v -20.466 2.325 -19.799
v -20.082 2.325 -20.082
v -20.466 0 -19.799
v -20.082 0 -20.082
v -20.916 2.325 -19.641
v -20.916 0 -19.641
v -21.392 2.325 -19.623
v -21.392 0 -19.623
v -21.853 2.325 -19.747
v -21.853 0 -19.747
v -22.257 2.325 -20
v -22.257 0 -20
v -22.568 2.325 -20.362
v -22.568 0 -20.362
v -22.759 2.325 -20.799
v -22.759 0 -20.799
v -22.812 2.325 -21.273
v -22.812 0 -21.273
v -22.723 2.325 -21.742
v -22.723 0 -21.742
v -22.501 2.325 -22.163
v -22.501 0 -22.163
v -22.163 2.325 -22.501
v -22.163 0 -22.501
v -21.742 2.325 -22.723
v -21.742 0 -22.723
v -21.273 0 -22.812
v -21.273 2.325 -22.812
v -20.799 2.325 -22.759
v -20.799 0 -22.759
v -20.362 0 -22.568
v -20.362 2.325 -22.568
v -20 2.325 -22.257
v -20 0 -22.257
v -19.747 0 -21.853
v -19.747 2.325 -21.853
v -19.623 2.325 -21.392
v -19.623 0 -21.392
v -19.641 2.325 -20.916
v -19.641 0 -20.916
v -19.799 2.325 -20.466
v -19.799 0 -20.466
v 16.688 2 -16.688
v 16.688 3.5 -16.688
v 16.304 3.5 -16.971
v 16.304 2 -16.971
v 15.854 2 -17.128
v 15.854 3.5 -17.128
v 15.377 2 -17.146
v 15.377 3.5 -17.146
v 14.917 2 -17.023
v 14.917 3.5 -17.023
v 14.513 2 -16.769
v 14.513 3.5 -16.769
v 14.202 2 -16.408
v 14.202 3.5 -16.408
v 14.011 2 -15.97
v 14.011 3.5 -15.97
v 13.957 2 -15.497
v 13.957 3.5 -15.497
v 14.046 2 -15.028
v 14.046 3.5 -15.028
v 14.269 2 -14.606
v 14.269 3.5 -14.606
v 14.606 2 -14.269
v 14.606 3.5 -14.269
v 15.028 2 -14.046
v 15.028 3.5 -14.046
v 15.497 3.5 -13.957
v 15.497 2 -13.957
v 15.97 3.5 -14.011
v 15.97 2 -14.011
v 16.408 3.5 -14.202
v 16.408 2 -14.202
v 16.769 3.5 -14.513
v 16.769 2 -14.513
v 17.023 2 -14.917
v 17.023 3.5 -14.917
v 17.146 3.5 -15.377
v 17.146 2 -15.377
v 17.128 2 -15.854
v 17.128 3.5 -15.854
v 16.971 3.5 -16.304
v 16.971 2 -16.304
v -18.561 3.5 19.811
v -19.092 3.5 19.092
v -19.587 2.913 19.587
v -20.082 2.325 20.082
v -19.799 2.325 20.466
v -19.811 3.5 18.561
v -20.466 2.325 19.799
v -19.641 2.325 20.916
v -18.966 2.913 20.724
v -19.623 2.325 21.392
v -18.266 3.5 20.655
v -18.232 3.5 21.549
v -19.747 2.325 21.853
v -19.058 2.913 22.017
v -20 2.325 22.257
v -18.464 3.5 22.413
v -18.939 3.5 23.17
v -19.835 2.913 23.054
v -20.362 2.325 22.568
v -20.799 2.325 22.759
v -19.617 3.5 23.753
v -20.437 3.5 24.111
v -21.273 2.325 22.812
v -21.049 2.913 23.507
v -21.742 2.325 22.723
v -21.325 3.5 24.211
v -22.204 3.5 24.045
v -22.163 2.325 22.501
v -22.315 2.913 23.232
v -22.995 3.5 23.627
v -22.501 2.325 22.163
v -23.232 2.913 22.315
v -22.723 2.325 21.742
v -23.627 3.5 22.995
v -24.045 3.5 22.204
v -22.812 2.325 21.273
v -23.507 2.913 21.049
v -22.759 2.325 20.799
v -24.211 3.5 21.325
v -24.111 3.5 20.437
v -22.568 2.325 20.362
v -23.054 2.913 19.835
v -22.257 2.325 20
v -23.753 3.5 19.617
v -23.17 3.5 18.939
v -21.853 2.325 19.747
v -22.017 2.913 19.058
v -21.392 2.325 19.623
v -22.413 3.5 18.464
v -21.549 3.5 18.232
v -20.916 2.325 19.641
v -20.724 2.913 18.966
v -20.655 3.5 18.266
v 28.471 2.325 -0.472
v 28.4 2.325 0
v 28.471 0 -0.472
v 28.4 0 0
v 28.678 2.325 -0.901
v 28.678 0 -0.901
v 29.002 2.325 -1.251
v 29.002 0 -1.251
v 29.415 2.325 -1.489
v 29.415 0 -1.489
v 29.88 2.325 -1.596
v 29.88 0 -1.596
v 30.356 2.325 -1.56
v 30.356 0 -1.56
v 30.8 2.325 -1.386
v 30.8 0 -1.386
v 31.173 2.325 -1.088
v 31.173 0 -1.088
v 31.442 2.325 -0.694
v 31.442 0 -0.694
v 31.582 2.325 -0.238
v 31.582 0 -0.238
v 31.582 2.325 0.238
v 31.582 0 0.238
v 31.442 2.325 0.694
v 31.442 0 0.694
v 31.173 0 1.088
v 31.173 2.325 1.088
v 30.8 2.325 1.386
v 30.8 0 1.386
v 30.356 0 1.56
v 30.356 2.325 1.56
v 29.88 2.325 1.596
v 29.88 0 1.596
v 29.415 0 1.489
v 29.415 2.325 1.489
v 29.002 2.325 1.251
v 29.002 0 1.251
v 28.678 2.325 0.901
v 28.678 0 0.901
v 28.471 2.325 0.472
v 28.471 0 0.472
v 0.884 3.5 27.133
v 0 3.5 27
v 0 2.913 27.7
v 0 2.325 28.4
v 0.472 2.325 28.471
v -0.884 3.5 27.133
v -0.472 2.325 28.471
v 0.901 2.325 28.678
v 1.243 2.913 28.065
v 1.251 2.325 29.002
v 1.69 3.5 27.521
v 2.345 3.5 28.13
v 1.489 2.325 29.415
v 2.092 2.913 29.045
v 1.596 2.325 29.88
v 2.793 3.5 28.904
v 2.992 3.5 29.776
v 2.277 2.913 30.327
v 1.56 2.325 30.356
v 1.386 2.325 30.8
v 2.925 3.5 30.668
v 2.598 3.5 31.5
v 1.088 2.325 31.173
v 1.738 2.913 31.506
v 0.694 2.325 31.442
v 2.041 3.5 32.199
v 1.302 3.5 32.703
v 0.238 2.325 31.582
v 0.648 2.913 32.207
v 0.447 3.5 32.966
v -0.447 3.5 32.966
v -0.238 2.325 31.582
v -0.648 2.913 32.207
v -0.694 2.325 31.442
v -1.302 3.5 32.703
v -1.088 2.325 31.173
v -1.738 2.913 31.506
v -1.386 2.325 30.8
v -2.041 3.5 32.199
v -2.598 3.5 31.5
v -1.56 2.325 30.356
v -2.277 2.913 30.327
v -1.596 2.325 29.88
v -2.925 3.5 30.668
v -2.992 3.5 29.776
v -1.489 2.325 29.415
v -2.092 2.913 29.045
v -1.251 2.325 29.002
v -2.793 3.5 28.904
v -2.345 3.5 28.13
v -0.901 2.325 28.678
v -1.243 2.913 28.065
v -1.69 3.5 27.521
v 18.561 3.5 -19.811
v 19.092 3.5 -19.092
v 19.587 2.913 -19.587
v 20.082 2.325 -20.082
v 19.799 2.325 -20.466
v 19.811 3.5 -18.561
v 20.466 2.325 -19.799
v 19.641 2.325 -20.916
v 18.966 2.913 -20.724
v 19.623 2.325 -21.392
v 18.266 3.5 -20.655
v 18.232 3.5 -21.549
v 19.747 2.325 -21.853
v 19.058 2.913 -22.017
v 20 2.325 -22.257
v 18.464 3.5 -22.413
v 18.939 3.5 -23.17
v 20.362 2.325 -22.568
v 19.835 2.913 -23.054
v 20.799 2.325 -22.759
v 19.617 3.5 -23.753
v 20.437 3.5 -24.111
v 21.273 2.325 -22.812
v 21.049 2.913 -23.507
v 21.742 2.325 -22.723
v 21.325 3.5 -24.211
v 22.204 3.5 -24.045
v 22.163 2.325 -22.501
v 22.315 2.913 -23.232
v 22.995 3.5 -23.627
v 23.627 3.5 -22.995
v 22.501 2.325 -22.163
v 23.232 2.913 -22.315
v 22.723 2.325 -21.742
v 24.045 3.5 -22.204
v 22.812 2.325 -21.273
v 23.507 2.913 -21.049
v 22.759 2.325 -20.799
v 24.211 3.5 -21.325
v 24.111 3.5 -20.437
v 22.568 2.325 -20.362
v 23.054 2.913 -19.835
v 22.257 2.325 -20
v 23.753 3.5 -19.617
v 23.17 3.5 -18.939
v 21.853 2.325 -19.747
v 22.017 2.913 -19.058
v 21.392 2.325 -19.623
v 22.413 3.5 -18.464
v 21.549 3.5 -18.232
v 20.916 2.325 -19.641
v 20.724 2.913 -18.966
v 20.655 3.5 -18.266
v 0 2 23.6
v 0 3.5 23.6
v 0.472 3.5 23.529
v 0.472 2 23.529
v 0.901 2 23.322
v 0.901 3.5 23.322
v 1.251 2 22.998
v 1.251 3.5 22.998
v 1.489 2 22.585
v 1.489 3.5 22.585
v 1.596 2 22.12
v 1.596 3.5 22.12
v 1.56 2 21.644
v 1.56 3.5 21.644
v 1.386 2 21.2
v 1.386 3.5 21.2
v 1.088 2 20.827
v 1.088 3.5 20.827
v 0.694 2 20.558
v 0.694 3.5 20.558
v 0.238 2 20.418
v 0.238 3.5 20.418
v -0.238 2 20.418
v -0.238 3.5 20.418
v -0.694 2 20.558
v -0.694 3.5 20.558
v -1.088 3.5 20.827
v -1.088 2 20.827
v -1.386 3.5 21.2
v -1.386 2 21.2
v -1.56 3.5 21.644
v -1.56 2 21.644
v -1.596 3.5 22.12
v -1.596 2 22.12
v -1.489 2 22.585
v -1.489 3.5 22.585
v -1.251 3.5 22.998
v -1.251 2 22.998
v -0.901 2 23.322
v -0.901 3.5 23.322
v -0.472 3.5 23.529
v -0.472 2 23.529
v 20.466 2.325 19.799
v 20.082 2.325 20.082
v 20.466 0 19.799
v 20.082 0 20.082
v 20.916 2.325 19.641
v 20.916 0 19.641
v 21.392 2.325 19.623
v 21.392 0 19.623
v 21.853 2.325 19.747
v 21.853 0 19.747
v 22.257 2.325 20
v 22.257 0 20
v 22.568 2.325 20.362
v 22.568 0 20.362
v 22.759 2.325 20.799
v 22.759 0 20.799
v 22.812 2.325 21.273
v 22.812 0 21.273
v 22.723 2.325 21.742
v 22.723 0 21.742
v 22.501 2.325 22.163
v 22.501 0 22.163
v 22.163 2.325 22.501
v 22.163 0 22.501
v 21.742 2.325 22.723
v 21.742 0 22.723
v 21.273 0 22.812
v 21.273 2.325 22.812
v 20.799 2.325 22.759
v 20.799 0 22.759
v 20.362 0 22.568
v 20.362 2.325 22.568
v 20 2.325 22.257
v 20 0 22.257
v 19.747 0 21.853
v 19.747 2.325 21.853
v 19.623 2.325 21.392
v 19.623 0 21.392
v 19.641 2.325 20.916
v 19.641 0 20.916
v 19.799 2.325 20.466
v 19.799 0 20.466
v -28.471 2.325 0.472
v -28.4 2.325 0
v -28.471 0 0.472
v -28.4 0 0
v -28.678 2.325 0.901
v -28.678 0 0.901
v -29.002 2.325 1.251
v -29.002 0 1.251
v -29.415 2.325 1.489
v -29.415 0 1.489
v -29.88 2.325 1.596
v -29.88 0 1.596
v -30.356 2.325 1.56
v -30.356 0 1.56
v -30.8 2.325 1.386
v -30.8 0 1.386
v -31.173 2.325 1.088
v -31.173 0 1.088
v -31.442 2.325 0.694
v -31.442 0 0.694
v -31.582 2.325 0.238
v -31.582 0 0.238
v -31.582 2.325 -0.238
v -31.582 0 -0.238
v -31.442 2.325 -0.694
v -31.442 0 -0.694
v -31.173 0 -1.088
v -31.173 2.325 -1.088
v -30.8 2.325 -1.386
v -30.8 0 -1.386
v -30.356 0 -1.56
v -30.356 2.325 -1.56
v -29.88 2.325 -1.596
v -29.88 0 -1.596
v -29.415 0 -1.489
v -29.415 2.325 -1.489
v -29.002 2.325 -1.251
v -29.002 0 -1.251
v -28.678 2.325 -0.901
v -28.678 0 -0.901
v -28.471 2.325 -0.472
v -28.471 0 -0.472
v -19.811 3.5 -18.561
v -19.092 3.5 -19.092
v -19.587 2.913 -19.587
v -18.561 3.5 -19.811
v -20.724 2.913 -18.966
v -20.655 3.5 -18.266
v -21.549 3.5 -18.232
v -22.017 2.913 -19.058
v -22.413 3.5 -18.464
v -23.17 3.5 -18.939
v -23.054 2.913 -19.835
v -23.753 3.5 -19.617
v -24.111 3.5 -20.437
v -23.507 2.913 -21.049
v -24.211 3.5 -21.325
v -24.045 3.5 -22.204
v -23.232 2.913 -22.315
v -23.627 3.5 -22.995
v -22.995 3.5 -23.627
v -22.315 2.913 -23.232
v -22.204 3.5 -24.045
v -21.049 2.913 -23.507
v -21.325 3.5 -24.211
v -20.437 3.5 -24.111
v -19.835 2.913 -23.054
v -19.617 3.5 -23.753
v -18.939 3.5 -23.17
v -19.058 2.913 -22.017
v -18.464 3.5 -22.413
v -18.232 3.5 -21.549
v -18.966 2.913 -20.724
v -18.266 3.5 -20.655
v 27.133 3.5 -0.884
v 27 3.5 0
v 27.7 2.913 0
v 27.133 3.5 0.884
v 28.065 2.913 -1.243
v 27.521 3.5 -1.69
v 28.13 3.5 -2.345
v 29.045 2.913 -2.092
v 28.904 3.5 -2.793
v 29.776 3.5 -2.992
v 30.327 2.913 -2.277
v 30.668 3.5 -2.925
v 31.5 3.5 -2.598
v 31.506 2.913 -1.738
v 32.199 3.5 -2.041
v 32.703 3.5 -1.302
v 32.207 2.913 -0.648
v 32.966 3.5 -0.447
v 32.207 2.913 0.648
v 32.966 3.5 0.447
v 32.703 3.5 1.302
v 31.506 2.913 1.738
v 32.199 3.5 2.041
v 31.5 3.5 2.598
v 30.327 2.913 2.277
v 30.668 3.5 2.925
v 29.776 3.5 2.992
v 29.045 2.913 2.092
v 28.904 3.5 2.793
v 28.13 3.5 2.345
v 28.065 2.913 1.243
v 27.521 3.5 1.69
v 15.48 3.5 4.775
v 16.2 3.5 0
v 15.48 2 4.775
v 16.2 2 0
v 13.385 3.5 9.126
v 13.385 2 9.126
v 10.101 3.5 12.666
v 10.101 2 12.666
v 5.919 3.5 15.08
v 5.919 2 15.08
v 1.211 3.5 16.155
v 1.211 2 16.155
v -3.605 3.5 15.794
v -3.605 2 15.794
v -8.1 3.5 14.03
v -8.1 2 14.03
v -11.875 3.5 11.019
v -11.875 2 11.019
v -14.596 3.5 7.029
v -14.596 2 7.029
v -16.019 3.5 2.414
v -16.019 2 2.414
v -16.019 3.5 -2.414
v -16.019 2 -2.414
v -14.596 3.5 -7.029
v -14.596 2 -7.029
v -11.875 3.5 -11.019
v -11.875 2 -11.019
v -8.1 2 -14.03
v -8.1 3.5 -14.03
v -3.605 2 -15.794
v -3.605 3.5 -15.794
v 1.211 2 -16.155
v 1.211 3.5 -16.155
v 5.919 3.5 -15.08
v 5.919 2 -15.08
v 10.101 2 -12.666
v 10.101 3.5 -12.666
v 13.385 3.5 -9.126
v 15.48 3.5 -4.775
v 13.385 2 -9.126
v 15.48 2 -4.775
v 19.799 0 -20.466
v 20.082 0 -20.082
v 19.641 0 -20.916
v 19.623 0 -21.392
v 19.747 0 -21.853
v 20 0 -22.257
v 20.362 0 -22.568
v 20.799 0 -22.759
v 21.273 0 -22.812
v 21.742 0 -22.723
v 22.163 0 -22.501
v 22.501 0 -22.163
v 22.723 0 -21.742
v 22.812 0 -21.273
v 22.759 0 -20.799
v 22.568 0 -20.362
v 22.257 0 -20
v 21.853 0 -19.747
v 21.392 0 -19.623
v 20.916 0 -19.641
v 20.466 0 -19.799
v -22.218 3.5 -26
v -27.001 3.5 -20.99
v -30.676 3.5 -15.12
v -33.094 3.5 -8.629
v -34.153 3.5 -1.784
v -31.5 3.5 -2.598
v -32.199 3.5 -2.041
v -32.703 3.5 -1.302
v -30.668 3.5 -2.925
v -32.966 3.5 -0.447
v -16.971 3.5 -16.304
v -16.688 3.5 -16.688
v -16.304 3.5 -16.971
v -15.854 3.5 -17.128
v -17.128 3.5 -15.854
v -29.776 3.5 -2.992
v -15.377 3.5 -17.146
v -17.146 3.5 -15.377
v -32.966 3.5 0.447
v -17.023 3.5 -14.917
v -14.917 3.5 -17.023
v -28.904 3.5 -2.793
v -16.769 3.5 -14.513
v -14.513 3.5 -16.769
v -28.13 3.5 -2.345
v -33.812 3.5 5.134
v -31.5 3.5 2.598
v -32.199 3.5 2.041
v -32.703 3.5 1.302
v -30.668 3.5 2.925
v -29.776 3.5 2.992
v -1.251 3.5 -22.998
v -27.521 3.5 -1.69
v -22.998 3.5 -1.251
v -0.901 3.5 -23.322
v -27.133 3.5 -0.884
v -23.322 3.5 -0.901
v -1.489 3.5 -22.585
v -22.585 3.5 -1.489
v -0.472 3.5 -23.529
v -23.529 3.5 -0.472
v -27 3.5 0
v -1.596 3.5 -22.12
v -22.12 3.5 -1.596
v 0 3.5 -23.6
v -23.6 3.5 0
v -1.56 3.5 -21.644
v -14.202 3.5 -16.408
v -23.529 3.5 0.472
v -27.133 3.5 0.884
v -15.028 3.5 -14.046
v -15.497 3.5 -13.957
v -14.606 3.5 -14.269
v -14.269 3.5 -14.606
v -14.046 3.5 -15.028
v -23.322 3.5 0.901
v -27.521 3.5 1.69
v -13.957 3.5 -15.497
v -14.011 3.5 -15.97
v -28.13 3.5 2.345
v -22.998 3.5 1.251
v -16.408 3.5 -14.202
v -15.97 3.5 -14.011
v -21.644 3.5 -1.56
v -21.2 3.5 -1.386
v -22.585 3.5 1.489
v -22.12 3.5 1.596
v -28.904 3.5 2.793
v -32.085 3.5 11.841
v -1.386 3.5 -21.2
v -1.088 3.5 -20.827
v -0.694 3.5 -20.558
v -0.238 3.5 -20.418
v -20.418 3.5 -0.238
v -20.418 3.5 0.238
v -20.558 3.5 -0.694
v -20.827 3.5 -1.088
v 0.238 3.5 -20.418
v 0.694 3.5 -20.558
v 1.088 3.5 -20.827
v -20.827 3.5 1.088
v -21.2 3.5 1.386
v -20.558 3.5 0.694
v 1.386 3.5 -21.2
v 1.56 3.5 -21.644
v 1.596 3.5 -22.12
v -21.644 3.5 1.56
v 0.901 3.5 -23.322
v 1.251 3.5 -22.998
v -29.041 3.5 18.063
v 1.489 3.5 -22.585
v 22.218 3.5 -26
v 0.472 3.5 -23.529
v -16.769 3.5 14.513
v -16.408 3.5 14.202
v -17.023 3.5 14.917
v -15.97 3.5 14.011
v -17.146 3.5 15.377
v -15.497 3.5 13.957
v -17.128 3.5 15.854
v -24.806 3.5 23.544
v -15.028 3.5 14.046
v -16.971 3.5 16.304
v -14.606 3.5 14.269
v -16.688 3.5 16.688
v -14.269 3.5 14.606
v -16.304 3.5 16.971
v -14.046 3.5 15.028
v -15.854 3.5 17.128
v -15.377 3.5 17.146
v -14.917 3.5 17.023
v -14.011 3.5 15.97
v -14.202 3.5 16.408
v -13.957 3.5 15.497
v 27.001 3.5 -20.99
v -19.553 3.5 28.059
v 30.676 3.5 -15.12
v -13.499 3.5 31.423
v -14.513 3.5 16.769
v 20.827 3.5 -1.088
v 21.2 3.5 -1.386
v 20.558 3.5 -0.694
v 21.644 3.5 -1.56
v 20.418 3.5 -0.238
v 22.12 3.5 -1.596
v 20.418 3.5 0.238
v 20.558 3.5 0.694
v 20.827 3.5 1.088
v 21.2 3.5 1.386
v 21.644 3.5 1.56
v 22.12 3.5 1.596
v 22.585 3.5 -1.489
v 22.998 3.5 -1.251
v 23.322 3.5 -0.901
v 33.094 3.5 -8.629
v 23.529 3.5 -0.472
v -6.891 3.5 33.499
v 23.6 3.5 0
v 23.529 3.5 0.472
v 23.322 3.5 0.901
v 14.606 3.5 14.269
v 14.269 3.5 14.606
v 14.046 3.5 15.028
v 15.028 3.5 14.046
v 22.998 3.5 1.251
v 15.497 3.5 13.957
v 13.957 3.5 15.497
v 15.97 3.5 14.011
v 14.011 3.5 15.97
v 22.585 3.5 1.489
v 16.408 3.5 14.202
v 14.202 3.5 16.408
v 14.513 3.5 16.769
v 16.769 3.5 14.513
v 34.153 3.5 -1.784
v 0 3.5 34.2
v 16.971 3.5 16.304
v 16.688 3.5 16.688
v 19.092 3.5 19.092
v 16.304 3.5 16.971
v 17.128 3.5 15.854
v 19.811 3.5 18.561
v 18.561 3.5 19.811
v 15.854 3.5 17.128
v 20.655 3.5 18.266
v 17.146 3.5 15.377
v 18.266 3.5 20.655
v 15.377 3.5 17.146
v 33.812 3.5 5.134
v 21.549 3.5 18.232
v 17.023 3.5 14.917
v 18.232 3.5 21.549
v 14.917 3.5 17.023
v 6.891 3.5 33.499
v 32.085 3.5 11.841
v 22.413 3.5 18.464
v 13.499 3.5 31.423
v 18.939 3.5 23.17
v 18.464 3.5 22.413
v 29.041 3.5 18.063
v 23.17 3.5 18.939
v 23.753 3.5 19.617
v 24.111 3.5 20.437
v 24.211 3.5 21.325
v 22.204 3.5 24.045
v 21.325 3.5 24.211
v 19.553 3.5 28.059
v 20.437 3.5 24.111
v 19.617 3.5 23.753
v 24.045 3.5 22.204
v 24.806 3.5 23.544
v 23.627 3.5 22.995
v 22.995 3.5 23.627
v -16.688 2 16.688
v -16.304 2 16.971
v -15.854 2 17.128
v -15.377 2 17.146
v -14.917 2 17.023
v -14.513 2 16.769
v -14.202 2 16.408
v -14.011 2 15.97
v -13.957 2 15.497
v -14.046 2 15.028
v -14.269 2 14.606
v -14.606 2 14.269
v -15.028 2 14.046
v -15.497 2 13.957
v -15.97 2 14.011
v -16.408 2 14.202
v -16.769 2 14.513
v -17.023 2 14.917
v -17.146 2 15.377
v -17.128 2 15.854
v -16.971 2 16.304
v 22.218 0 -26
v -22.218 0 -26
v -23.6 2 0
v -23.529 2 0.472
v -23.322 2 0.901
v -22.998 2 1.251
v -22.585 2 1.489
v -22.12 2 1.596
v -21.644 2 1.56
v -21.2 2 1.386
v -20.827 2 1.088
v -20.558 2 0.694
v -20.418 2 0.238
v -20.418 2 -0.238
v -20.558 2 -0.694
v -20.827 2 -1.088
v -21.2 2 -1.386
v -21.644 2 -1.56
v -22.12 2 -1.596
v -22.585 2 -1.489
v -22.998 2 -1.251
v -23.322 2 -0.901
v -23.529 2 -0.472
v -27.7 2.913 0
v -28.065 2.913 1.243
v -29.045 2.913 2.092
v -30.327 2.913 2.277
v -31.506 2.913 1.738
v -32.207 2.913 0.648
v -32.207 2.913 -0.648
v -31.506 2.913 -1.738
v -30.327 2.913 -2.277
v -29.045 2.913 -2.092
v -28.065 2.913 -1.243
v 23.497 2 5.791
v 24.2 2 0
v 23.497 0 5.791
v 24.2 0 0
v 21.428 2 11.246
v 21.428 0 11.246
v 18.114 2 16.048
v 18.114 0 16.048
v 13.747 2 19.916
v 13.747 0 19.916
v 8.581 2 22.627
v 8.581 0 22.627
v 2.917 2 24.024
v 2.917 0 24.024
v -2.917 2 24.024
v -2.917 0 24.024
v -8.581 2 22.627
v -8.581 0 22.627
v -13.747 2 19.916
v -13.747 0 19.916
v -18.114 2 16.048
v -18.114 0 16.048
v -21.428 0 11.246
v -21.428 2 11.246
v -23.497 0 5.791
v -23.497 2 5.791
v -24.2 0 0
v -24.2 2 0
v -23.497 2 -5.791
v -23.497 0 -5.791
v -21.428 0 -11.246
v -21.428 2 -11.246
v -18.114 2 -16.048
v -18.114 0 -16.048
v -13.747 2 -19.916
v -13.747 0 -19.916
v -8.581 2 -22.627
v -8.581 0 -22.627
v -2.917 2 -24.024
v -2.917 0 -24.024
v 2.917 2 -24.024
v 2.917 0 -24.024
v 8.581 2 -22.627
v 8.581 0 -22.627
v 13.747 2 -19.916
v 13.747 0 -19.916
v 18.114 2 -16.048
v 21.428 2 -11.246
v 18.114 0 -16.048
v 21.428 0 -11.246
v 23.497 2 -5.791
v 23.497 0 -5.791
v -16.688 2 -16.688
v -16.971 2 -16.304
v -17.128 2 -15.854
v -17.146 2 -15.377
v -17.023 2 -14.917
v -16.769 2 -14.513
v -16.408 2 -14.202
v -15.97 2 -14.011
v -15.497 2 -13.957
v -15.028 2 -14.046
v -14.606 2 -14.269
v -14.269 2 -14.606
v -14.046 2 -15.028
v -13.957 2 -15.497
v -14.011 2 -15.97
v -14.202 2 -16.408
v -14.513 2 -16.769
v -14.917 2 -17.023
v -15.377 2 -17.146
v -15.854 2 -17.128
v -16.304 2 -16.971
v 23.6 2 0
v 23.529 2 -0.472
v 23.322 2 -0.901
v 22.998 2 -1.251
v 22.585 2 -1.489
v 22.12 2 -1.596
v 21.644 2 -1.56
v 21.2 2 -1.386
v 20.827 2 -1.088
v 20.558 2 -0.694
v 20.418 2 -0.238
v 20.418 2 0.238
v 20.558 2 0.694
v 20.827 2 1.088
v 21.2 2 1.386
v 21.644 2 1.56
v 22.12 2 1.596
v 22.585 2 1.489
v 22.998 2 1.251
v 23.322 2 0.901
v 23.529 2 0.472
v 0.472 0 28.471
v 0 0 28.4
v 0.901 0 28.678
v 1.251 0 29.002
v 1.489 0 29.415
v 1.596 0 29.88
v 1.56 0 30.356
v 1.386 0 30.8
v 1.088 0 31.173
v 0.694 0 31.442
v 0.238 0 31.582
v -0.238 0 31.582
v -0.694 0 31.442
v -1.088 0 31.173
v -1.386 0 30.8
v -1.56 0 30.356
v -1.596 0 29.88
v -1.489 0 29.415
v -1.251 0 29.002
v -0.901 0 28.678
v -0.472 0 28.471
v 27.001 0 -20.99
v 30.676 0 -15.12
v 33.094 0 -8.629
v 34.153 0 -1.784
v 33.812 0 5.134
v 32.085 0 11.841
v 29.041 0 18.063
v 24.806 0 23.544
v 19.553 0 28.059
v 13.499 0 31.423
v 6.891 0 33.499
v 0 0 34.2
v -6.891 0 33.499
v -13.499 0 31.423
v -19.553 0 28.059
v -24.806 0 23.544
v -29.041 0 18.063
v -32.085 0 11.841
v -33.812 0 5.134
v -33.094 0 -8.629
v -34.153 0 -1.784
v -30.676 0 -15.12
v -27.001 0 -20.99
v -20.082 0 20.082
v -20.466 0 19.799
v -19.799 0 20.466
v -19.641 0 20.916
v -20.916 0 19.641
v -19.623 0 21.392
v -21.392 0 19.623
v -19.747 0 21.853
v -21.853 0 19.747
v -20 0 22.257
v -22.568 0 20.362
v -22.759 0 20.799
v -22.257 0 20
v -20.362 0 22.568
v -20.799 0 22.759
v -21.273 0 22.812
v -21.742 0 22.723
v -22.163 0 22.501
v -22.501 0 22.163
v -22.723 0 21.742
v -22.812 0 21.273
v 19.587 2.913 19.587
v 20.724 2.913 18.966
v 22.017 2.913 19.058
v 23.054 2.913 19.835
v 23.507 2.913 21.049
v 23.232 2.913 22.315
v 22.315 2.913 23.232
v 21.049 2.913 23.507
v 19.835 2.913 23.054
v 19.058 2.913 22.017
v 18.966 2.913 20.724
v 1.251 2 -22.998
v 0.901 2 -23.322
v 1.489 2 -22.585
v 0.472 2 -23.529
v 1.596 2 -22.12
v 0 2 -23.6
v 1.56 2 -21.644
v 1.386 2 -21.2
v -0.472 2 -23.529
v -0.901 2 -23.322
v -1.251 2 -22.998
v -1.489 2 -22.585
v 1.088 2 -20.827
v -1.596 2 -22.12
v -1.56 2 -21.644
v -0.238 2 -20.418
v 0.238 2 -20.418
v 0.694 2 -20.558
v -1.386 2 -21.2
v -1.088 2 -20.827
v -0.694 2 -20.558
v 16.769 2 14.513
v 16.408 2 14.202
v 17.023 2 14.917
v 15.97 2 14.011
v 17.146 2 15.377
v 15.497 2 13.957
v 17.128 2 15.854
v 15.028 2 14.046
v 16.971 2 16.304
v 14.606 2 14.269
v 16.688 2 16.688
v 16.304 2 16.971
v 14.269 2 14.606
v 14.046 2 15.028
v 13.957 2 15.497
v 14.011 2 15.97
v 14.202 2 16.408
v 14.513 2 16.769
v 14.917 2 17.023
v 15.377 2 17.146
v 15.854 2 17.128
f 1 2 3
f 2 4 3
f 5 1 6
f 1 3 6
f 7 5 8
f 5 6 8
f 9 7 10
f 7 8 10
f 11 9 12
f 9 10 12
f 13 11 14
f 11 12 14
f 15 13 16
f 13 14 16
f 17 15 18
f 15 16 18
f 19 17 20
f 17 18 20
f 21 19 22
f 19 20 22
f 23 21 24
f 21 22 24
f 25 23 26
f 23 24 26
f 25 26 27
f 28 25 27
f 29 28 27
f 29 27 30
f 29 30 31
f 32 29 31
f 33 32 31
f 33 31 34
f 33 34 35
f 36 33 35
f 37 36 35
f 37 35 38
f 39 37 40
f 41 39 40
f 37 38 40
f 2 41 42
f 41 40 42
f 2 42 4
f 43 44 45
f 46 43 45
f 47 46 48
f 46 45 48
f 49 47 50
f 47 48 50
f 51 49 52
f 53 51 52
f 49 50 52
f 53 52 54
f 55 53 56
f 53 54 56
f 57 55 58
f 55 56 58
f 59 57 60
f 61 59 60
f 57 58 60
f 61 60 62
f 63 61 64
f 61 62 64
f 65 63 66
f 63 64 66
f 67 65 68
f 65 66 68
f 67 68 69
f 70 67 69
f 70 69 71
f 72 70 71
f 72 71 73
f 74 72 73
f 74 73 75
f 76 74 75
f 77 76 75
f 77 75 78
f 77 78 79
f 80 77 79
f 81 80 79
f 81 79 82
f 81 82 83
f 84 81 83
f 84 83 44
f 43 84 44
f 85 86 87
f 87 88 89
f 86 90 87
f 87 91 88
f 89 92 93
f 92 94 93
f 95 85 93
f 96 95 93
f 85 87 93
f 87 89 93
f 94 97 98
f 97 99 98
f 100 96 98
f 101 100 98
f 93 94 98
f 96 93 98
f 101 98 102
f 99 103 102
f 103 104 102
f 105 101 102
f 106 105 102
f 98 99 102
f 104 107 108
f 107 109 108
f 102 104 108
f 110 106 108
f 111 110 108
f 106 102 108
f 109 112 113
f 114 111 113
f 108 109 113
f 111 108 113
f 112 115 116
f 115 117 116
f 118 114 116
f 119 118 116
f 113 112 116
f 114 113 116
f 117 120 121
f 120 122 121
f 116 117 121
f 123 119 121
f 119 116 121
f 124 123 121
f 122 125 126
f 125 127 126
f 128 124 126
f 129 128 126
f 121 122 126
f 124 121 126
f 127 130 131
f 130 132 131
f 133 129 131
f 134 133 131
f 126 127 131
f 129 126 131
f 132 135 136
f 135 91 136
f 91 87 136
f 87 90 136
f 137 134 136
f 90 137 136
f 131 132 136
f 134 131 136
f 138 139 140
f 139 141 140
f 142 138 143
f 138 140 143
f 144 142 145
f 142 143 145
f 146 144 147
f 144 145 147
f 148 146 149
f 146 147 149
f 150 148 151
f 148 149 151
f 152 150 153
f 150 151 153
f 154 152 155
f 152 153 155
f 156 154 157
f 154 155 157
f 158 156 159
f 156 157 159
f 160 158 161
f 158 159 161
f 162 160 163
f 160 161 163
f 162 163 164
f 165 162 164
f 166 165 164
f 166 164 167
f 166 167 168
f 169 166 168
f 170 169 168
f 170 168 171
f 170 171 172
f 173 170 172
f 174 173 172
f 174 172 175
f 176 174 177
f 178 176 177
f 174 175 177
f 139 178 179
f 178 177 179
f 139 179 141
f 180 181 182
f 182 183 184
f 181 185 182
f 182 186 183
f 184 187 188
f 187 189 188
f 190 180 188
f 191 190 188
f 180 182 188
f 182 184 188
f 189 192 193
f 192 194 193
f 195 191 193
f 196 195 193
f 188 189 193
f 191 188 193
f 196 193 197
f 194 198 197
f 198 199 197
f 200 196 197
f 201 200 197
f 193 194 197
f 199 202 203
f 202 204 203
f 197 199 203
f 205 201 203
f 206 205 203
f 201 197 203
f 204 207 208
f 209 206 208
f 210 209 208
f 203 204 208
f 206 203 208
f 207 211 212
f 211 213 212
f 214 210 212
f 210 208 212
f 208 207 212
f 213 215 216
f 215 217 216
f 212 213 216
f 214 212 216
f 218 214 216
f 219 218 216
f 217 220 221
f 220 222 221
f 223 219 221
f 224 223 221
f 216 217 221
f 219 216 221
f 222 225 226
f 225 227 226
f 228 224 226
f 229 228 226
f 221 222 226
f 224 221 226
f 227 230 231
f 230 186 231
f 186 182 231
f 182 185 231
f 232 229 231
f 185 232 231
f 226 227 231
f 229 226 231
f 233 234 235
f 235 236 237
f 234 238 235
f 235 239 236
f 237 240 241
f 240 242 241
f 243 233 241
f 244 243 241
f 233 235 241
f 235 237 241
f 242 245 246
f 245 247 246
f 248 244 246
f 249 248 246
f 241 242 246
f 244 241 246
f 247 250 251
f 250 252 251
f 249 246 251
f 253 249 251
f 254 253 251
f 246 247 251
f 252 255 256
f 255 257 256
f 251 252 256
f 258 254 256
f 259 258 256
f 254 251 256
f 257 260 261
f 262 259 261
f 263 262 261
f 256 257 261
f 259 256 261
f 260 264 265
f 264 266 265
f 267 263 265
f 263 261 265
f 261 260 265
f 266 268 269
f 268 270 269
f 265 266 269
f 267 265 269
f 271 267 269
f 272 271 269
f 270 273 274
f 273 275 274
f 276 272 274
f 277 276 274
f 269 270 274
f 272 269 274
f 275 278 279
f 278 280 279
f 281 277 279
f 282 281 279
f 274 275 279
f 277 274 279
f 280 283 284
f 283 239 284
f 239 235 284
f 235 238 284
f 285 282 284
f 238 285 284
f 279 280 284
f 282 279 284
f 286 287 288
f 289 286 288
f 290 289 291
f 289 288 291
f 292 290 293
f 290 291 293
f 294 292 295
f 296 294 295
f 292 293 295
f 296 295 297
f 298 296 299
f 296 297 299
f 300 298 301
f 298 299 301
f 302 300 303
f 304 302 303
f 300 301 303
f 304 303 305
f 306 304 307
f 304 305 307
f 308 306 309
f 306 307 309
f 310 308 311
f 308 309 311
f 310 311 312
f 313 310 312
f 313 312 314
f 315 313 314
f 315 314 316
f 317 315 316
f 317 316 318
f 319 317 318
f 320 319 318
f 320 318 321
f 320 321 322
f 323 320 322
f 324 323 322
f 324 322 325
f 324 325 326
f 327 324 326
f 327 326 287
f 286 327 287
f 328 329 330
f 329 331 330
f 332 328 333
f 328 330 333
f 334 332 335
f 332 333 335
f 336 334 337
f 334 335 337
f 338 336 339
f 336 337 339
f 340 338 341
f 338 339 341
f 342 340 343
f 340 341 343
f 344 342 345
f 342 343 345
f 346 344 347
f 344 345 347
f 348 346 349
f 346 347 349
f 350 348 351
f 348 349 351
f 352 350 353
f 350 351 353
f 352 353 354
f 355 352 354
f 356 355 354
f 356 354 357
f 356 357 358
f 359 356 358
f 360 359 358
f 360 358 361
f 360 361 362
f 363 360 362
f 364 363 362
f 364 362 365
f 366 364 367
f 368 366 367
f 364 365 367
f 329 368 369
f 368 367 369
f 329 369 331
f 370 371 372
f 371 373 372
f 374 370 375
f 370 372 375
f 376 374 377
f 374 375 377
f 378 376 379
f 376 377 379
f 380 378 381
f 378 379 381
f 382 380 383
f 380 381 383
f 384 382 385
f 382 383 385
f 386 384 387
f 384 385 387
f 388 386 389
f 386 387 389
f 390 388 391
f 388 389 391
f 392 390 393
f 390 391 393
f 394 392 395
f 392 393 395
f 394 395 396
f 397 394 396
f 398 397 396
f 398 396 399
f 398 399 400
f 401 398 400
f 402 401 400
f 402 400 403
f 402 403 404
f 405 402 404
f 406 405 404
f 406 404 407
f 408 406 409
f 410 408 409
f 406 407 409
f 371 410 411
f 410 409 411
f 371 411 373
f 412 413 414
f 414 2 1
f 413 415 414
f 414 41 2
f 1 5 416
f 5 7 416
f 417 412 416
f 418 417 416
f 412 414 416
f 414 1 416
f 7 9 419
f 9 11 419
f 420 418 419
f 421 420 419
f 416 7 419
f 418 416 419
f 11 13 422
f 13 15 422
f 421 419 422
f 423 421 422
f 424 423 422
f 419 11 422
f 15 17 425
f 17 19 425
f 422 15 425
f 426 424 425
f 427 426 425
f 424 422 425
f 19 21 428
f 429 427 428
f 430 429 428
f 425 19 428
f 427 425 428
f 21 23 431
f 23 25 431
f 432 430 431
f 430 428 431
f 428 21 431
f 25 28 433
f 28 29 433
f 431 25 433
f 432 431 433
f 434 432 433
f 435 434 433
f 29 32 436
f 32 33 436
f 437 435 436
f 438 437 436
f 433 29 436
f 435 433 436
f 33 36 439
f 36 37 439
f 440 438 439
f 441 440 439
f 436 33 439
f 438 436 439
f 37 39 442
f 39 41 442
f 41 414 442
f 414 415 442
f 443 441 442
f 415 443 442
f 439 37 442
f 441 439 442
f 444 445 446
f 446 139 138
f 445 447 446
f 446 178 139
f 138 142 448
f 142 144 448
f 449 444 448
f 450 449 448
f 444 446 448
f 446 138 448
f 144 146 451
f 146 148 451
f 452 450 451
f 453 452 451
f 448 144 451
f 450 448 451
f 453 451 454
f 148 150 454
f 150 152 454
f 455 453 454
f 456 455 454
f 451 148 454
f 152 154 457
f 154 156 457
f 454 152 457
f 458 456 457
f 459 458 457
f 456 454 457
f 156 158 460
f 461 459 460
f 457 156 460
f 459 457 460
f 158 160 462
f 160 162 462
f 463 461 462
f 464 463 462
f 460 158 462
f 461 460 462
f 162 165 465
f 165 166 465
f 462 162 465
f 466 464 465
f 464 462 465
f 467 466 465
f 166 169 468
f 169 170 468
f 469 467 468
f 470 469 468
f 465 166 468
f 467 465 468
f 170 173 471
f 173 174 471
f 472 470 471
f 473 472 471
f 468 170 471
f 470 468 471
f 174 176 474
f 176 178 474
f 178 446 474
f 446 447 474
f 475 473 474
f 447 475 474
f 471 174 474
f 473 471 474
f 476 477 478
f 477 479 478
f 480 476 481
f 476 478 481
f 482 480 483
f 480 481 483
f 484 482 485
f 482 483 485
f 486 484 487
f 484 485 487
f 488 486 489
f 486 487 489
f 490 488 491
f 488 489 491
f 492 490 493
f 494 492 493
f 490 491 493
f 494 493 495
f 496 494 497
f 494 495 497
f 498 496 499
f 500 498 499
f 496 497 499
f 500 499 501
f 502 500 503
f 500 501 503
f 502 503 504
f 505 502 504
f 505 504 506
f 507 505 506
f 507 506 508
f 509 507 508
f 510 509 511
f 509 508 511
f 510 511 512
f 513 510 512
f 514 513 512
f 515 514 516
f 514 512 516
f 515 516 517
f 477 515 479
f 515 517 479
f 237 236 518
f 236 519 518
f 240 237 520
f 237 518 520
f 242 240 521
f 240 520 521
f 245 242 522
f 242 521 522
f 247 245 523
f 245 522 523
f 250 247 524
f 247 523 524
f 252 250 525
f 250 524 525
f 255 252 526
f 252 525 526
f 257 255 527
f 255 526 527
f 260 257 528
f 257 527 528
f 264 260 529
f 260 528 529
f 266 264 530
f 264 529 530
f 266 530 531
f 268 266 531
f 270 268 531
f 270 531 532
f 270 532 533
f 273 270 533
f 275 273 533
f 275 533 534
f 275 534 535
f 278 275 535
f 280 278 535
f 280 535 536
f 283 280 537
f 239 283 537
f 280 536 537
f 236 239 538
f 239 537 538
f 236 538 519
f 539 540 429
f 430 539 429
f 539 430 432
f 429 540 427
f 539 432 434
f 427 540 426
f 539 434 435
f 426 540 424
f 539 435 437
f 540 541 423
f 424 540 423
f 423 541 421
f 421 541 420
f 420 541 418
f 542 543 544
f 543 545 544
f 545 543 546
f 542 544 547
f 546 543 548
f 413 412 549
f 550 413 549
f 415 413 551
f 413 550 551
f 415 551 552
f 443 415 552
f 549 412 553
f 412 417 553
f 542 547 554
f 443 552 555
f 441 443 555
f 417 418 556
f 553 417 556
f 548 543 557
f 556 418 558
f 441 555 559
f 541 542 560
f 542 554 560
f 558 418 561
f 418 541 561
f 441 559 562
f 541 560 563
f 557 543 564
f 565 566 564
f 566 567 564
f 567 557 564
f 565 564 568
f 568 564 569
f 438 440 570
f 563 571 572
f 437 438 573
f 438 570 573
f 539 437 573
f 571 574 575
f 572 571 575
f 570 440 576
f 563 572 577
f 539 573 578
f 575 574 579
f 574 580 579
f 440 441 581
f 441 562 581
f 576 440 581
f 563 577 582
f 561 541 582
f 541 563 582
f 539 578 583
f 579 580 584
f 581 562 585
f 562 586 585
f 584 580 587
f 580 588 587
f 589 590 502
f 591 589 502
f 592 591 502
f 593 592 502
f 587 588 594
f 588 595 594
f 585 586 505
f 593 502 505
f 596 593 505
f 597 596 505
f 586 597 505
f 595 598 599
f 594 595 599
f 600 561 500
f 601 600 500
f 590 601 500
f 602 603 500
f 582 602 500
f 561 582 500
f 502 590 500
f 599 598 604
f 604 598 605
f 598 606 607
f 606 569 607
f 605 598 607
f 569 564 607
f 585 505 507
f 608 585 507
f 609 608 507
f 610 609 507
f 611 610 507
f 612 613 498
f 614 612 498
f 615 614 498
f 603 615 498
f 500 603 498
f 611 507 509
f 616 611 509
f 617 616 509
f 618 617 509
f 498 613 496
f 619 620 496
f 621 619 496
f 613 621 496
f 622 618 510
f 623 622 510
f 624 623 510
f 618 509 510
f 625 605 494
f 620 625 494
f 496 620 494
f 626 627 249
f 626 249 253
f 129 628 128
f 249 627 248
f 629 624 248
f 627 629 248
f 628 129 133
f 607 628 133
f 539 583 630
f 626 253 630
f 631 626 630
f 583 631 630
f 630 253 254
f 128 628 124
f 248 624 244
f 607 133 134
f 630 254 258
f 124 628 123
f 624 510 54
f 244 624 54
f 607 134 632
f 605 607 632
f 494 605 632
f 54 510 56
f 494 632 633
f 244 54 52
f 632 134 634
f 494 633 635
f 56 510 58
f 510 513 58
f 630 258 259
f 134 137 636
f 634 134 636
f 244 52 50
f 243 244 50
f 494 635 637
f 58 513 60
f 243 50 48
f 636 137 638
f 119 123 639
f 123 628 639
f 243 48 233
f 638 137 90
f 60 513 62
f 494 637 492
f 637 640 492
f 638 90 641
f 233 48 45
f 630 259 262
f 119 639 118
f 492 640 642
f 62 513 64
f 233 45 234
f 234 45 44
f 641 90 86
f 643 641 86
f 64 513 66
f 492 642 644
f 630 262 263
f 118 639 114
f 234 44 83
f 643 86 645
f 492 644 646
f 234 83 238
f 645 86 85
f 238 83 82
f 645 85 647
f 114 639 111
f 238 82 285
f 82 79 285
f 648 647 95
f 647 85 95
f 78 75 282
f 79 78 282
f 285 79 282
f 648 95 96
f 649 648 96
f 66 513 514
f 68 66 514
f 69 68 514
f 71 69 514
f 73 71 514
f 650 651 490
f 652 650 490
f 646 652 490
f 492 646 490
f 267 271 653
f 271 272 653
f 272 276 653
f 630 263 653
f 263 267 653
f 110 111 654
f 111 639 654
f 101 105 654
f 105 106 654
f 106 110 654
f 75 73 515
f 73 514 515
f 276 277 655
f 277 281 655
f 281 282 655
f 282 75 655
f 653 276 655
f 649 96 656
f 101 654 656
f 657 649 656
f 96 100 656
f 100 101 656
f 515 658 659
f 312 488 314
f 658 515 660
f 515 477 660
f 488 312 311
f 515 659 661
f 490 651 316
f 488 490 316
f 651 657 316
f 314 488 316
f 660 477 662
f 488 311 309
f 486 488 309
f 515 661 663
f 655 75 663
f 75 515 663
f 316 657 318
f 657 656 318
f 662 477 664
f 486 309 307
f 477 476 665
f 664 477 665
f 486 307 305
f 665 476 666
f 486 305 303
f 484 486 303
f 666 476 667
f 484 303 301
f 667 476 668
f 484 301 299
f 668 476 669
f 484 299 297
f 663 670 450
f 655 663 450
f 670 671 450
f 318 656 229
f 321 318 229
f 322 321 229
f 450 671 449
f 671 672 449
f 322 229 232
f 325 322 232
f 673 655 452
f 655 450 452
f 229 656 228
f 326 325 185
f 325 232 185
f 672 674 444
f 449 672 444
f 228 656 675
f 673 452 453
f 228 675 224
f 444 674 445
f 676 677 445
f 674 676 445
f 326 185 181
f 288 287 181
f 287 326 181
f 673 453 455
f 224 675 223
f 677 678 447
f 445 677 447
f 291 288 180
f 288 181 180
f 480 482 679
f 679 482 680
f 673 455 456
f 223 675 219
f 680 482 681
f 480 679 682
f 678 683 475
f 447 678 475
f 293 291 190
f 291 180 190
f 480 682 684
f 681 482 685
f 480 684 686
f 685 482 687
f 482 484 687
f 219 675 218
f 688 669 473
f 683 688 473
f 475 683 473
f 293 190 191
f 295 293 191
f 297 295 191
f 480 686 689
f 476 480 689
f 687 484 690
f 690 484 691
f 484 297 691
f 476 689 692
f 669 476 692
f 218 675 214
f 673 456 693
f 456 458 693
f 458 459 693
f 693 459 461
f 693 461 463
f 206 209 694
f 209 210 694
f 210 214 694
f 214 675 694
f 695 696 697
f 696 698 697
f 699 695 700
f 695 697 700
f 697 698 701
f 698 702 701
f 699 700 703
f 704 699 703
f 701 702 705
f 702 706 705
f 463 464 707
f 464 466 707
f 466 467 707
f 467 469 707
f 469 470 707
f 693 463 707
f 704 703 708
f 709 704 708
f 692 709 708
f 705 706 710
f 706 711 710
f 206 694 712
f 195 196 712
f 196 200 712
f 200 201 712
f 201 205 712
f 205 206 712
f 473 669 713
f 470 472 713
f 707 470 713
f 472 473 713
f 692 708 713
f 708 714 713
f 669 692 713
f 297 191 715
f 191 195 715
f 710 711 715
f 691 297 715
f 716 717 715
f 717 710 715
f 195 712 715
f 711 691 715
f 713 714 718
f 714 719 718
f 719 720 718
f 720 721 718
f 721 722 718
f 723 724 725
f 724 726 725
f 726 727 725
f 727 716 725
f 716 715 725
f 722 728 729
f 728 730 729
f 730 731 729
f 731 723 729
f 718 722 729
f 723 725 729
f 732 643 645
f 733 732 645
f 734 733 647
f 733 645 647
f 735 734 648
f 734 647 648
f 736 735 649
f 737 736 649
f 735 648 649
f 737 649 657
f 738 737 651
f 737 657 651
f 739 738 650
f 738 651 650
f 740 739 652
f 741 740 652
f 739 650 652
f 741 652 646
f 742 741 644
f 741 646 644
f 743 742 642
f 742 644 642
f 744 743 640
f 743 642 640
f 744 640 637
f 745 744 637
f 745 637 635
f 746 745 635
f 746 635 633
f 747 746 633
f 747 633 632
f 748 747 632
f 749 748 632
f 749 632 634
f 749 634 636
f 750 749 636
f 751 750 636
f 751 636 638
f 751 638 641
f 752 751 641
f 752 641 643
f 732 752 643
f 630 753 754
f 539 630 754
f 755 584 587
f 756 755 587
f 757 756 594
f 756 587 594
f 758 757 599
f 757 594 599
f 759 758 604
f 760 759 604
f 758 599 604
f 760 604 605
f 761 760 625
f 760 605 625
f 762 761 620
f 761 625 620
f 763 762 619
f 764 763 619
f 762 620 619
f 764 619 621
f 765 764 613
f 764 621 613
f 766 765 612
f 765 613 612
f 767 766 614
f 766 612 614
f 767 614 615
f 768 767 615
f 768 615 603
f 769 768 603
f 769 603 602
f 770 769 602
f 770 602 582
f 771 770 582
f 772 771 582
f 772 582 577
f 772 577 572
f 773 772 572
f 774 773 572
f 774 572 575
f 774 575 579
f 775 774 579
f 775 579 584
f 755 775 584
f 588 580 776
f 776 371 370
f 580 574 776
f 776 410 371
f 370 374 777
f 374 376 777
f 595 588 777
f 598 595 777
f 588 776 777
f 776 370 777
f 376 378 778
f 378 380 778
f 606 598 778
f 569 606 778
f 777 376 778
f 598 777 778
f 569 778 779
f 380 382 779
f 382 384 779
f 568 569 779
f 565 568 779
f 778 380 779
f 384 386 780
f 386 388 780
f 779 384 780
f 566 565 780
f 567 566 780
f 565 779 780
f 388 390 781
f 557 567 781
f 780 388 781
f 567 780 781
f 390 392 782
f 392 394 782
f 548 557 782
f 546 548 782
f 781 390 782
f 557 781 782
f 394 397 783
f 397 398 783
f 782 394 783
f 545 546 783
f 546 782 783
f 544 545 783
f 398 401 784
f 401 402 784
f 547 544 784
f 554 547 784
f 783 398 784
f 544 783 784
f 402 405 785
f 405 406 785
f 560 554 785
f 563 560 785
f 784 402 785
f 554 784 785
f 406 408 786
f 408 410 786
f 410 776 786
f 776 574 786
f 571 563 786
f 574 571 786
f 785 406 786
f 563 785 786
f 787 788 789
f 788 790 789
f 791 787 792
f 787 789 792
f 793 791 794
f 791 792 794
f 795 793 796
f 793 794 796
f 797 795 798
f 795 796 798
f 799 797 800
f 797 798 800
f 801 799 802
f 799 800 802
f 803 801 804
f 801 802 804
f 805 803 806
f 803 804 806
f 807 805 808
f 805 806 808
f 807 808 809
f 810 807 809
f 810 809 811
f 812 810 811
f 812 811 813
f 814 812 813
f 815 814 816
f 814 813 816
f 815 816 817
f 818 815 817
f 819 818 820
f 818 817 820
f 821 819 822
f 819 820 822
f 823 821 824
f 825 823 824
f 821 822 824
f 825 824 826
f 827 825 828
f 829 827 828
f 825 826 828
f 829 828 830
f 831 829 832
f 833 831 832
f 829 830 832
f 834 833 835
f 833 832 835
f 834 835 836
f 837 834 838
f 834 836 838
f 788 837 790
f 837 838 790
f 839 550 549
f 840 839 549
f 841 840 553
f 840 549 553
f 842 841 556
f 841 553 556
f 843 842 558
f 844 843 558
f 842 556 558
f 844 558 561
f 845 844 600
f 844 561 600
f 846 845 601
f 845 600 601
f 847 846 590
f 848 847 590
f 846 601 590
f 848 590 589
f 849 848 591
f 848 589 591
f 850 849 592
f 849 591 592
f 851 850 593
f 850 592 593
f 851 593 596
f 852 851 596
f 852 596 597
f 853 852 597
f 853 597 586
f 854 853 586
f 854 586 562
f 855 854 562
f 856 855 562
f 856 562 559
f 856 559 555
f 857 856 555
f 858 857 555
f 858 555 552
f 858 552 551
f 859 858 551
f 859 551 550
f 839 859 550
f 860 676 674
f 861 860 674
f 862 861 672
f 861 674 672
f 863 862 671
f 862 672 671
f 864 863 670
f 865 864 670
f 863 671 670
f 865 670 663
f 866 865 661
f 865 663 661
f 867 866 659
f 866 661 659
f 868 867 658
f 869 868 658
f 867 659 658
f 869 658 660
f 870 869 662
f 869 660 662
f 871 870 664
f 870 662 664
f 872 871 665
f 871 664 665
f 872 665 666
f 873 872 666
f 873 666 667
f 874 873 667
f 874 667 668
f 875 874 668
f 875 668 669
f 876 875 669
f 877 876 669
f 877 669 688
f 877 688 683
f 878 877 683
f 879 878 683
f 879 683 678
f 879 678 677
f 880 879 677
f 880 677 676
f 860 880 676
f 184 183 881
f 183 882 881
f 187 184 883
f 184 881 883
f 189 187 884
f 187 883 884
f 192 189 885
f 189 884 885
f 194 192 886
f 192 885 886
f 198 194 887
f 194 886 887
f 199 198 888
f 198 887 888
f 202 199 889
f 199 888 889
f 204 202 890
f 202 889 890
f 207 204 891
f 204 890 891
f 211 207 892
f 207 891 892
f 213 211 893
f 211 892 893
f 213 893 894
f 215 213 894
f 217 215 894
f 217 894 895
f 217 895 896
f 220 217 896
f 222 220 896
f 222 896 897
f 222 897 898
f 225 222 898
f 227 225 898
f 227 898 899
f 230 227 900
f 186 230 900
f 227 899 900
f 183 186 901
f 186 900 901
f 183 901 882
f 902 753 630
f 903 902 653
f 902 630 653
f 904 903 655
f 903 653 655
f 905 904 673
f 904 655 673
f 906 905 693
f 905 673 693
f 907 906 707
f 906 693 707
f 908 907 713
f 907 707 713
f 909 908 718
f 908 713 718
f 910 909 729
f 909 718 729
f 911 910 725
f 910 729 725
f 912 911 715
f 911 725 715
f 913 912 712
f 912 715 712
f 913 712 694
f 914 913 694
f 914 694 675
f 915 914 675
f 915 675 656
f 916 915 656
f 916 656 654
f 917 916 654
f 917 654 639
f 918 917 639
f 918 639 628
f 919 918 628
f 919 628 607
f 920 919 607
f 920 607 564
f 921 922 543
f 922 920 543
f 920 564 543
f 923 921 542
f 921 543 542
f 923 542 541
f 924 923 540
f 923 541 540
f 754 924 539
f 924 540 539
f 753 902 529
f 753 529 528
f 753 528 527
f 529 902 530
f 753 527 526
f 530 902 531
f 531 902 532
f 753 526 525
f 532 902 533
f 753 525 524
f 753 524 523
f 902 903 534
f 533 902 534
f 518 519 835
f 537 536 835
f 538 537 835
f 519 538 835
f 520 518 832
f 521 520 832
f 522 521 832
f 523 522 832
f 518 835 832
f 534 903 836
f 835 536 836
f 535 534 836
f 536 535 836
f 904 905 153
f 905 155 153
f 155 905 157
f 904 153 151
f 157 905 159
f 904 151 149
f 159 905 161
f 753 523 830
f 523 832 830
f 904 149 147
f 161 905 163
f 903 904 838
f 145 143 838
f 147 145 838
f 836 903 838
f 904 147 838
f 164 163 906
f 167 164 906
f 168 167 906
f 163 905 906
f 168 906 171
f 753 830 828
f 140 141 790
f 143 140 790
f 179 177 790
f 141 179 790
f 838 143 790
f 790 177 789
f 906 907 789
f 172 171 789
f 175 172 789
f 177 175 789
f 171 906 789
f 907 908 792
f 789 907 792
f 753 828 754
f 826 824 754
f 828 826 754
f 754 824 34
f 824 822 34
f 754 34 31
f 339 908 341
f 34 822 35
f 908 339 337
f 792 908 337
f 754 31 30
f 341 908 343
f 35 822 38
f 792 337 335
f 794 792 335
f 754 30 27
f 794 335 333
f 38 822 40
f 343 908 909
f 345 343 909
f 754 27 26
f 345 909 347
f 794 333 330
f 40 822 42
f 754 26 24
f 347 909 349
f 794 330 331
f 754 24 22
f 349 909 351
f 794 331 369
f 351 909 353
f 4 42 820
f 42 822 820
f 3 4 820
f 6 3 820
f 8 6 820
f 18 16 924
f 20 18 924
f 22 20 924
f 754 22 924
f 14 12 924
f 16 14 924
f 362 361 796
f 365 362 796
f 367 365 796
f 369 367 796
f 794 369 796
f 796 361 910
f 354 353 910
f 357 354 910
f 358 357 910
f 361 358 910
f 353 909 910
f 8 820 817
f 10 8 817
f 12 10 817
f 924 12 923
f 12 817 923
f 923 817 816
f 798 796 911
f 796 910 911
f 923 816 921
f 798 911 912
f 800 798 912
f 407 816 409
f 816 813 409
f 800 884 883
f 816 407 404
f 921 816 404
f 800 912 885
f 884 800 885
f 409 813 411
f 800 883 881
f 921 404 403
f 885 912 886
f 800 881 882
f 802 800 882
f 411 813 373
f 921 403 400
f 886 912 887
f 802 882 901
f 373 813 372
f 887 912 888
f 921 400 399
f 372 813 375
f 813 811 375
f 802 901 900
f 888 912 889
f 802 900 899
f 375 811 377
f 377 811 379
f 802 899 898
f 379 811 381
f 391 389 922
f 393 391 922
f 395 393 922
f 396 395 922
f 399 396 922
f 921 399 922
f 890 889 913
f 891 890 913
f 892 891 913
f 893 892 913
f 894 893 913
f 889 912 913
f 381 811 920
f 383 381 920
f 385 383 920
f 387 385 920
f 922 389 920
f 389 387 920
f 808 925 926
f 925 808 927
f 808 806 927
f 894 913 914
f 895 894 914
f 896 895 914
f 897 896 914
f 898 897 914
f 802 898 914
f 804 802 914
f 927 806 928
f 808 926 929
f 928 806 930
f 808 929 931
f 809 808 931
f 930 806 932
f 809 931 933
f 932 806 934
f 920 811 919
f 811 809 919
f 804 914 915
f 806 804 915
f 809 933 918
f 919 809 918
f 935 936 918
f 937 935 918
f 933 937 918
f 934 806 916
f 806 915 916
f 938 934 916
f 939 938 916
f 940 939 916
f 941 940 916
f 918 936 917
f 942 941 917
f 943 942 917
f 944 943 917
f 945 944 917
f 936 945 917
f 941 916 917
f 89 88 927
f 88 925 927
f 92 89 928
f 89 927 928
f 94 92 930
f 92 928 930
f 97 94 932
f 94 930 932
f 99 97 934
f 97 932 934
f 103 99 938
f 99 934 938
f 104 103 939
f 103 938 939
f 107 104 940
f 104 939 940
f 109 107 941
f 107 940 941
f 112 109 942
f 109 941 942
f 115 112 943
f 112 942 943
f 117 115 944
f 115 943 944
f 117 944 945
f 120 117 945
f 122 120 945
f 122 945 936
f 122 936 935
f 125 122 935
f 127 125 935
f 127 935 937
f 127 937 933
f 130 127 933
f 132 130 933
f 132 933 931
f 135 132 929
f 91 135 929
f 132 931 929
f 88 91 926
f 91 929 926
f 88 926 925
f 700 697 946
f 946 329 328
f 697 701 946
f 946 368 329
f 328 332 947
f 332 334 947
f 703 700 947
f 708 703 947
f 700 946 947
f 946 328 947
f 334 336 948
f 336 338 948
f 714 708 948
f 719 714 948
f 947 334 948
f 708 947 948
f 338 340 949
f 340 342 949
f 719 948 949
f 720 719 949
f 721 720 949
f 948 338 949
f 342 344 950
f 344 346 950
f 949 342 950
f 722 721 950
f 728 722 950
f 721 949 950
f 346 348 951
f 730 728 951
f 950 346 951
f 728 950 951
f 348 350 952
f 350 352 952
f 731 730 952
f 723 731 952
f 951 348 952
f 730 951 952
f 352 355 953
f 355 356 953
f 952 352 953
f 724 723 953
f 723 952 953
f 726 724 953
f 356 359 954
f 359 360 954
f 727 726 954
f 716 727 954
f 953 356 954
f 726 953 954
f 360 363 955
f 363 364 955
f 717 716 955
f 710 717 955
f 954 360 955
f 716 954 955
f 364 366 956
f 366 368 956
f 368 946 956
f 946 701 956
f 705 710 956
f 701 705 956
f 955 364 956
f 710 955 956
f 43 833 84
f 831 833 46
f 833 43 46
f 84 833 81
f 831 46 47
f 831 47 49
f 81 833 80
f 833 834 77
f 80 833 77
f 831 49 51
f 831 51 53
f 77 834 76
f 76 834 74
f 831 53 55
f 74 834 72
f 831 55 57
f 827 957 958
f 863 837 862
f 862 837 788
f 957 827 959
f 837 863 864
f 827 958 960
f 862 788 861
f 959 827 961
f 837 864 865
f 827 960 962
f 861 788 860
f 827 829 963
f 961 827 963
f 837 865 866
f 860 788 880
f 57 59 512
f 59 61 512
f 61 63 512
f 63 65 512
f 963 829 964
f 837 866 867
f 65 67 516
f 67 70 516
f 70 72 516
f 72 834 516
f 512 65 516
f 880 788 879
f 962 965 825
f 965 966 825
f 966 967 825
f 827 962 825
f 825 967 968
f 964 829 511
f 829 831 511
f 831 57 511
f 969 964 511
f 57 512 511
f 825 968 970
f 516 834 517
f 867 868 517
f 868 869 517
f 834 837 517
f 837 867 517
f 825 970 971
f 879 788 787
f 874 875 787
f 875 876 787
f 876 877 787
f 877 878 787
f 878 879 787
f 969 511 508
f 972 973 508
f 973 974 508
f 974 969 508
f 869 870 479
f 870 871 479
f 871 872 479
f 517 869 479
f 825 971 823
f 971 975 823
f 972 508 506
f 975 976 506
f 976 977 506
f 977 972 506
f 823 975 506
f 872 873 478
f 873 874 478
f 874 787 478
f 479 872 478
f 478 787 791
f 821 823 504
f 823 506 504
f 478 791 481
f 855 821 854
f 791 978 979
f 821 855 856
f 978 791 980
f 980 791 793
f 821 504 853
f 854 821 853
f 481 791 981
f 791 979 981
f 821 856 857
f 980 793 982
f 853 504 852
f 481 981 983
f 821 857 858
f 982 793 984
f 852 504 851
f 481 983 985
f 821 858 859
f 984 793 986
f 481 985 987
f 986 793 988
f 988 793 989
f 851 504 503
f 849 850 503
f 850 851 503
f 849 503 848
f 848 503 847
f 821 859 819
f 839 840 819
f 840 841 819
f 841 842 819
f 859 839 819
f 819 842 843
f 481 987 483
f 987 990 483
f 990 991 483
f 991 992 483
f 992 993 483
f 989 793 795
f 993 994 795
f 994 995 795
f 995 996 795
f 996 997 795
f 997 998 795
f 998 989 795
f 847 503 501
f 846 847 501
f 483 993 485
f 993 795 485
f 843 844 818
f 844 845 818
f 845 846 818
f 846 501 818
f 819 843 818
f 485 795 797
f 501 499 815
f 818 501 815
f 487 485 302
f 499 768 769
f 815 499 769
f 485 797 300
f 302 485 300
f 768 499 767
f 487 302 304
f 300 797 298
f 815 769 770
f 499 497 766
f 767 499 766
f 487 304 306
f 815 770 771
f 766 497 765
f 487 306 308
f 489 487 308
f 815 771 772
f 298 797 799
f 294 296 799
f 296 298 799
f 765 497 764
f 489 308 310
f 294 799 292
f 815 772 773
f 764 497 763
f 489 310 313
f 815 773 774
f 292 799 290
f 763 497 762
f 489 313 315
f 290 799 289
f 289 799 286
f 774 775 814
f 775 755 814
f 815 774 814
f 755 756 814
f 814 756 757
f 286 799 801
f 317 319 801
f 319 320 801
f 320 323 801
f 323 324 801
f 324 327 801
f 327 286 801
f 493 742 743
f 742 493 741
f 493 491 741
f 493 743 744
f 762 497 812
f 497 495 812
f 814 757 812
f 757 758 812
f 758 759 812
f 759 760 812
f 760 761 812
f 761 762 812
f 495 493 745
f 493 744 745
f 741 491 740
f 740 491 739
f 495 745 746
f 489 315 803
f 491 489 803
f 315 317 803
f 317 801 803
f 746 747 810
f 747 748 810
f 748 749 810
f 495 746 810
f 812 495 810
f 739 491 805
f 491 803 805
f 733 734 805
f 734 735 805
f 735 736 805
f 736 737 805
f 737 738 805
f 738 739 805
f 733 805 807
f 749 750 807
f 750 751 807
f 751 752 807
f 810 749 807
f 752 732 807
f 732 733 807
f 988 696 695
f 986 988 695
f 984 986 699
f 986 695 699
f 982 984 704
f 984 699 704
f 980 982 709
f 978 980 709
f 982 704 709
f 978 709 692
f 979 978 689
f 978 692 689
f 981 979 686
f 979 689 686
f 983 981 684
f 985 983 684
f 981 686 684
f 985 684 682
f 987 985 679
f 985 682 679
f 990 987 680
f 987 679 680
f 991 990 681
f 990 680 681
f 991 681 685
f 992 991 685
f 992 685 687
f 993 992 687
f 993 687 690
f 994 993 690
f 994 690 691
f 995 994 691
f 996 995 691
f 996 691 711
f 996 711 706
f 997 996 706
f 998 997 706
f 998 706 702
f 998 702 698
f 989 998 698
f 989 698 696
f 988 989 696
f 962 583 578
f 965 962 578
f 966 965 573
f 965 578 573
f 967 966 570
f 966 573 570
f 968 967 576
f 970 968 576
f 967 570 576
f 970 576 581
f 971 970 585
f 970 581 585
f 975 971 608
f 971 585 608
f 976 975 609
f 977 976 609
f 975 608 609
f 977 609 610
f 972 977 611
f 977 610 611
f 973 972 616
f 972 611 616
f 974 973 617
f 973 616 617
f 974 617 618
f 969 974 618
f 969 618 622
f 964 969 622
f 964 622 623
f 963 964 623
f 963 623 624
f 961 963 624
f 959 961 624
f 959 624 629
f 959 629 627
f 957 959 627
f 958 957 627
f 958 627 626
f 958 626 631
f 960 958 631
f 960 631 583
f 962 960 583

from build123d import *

# Parameters (mm, degrees)
ESQUISSE3_R                                    = 1.6
ENL_V_MAT_EXTRU_1_DEPTH                        = 4.5
FRAISAGE_POUR_VIS_T_TE_FRAIS_E_100_D           = 3.2
FRAISAGE_POUR_VIS_T_TE_FRAIS_E_100_CSINK_D     = 6
FRAISAGE_POUR_VIS_T_TE_FRAIS_E_100_CSINK_ANGLE = 100
R_P_TITION_CIRCULAIRE1_COUNT                   = 8
SKETCH1_W                                      = 44.436021424
SKETCH1_H                                      = 8.2
CUT_EXTRUDE1_DEPTH                             = 4.5


with BuildPart() as part:
    # Esquisse2 → Révolution1 (revolve)
    with BuildSketch(Plane.XY):
        Polygon((34.2, 0), (34.2, 3.5), (16.2, 3.5), (16.2, 2), (24.2, 2), (24.2, 0), align=None)
    revolve(axis=Axis((0, 37.373365456, 0), (0, -1, 0)))

    # Esquisse3 → Enlèv. mat.-Extru.1 (cut, through all)
    with BuildSketch(Plane(origin=(0, 3.5, 0), x_dir=(1, 0, 0), z_dir=(0, 1, 0))):
        with Locations((22, 0)):
            Circle(ESQUISSE3_R)
    enl_v_mat_extru_1 = extrude(amount=-ENL_V_MAT_EXTRU_1_DEPTH, mode=Mode.SUBTRACT)

    # Fraisage pour vis à tête fraisée (100) #01 (through all)
    with Locations(Plane(origin=(0, 3.5, 0), x_dir=(1, 0, 0), z_dir=(0, 1, 0))):
        with Locations((30, 0)):
            fraisage_pour_vis_t_te_frais_e_100 = CounterSinkHole(FRAISAGE_POUR_VIS_T_TE_FRAIS_E_100_D / 2, FRAISAGE_POUR_VIS_T_TE_FRAIS_E_100_CSINK_D / 2, counter_sink_angle=FRAISAGE_POUR_VIS_T_TE_FRAIS_E_100_CSINK_ANGLE)

    # Répétition circulaire1: Enlèv. mat.-Extru.1, Fraisage pour vis à tête fraisée (100) #01 ×8 about axis
    r_p_tition_circulaire1_axis = Axis((0, 0, 0), (0, 1, 0))
    for i in range(1, R_P_TITION_CIRCULAIRE1_COUNT):
        add(enl_v_mat_extru_1.rotate(r_p_tition_circulaire1_axis, i * 360 / R_P_TITION_CIRCULAIRE1_COUNT), mode=Mode.SUBTRACT)
        add(fraisage_pour_vis_t_te_frais_e_100.rotate(r_p_tition_circulaire1_axis, i * 360 / R_P_TITION_CIRCULAIRE1_COUNT), mode=Mode.SUBTRACT)

    # Sketch1 → Cut-Extrude1 (cut, through all)
    with BuildSketch(Plane(origin=(0, 0, 0), x_dir=(-1, 0, 0), z_dir=(0, -1, 0))):
        with Locations((0, 30.1)):
            Rectangle(SKETCH1_W, SKETCH1_H)
    extrude(amount=-CUT_EXTRUDE1_DEPTH, mode=Mode.SUBTRACT)


solid = part.part
